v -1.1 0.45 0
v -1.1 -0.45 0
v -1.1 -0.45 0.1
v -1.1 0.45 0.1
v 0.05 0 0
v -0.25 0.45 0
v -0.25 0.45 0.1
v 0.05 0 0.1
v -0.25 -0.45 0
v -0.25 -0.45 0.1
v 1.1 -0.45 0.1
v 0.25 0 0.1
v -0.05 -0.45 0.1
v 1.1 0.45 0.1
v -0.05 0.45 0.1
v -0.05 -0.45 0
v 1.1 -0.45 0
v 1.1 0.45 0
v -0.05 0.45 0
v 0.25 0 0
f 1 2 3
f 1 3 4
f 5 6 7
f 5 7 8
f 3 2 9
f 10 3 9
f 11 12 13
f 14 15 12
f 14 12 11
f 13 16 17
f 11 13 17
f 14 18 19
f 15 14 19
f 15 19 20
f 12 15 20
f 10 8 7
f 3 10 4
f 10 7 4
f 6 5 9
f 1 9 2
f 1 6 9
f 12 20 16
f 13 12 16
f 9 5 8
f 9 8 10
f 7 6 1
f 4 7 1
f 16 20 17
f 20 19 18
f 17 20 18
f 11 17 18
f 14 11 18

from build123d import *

# Parameters (mm, degrees)
BOSS_EXTRU_1_DEPTH   = 0.1
BOSS_EXTRU_1_2_DEPTH = 0.1


with BuildPart() as part:
    # Esquisse1 → Boss.-Extru.1 (new body)
    with BuildSketch(Plane.XY):
        Polygon((-1.1, 0.45), (-0.5, 0.45), (-0.25, 0.45), (0.05, 0), (-0.25, -0.45), (-0.5, -0.45), (-1.1, -0.45), align=None)
    extrude(amount=BOSS_EXTRU_1_DEPTH)


with BuildPart() as body_2:
    # Esquisse1 → Boss.-Extru.1 2 (new body)
    with BuildSketch(Plane.XY):
        Polygon((1.1, 0.45), (0.5, 0.45), (-0.05, 0.45), (0.25, 0), (-0.05, -0.45), (0.5, -0.45), (1.1, -0.45), align=None)
    extrude(amount=BOSS_EXTRU_1_2_DEPTH)


solid = Compound([part.part, body_2.part])
